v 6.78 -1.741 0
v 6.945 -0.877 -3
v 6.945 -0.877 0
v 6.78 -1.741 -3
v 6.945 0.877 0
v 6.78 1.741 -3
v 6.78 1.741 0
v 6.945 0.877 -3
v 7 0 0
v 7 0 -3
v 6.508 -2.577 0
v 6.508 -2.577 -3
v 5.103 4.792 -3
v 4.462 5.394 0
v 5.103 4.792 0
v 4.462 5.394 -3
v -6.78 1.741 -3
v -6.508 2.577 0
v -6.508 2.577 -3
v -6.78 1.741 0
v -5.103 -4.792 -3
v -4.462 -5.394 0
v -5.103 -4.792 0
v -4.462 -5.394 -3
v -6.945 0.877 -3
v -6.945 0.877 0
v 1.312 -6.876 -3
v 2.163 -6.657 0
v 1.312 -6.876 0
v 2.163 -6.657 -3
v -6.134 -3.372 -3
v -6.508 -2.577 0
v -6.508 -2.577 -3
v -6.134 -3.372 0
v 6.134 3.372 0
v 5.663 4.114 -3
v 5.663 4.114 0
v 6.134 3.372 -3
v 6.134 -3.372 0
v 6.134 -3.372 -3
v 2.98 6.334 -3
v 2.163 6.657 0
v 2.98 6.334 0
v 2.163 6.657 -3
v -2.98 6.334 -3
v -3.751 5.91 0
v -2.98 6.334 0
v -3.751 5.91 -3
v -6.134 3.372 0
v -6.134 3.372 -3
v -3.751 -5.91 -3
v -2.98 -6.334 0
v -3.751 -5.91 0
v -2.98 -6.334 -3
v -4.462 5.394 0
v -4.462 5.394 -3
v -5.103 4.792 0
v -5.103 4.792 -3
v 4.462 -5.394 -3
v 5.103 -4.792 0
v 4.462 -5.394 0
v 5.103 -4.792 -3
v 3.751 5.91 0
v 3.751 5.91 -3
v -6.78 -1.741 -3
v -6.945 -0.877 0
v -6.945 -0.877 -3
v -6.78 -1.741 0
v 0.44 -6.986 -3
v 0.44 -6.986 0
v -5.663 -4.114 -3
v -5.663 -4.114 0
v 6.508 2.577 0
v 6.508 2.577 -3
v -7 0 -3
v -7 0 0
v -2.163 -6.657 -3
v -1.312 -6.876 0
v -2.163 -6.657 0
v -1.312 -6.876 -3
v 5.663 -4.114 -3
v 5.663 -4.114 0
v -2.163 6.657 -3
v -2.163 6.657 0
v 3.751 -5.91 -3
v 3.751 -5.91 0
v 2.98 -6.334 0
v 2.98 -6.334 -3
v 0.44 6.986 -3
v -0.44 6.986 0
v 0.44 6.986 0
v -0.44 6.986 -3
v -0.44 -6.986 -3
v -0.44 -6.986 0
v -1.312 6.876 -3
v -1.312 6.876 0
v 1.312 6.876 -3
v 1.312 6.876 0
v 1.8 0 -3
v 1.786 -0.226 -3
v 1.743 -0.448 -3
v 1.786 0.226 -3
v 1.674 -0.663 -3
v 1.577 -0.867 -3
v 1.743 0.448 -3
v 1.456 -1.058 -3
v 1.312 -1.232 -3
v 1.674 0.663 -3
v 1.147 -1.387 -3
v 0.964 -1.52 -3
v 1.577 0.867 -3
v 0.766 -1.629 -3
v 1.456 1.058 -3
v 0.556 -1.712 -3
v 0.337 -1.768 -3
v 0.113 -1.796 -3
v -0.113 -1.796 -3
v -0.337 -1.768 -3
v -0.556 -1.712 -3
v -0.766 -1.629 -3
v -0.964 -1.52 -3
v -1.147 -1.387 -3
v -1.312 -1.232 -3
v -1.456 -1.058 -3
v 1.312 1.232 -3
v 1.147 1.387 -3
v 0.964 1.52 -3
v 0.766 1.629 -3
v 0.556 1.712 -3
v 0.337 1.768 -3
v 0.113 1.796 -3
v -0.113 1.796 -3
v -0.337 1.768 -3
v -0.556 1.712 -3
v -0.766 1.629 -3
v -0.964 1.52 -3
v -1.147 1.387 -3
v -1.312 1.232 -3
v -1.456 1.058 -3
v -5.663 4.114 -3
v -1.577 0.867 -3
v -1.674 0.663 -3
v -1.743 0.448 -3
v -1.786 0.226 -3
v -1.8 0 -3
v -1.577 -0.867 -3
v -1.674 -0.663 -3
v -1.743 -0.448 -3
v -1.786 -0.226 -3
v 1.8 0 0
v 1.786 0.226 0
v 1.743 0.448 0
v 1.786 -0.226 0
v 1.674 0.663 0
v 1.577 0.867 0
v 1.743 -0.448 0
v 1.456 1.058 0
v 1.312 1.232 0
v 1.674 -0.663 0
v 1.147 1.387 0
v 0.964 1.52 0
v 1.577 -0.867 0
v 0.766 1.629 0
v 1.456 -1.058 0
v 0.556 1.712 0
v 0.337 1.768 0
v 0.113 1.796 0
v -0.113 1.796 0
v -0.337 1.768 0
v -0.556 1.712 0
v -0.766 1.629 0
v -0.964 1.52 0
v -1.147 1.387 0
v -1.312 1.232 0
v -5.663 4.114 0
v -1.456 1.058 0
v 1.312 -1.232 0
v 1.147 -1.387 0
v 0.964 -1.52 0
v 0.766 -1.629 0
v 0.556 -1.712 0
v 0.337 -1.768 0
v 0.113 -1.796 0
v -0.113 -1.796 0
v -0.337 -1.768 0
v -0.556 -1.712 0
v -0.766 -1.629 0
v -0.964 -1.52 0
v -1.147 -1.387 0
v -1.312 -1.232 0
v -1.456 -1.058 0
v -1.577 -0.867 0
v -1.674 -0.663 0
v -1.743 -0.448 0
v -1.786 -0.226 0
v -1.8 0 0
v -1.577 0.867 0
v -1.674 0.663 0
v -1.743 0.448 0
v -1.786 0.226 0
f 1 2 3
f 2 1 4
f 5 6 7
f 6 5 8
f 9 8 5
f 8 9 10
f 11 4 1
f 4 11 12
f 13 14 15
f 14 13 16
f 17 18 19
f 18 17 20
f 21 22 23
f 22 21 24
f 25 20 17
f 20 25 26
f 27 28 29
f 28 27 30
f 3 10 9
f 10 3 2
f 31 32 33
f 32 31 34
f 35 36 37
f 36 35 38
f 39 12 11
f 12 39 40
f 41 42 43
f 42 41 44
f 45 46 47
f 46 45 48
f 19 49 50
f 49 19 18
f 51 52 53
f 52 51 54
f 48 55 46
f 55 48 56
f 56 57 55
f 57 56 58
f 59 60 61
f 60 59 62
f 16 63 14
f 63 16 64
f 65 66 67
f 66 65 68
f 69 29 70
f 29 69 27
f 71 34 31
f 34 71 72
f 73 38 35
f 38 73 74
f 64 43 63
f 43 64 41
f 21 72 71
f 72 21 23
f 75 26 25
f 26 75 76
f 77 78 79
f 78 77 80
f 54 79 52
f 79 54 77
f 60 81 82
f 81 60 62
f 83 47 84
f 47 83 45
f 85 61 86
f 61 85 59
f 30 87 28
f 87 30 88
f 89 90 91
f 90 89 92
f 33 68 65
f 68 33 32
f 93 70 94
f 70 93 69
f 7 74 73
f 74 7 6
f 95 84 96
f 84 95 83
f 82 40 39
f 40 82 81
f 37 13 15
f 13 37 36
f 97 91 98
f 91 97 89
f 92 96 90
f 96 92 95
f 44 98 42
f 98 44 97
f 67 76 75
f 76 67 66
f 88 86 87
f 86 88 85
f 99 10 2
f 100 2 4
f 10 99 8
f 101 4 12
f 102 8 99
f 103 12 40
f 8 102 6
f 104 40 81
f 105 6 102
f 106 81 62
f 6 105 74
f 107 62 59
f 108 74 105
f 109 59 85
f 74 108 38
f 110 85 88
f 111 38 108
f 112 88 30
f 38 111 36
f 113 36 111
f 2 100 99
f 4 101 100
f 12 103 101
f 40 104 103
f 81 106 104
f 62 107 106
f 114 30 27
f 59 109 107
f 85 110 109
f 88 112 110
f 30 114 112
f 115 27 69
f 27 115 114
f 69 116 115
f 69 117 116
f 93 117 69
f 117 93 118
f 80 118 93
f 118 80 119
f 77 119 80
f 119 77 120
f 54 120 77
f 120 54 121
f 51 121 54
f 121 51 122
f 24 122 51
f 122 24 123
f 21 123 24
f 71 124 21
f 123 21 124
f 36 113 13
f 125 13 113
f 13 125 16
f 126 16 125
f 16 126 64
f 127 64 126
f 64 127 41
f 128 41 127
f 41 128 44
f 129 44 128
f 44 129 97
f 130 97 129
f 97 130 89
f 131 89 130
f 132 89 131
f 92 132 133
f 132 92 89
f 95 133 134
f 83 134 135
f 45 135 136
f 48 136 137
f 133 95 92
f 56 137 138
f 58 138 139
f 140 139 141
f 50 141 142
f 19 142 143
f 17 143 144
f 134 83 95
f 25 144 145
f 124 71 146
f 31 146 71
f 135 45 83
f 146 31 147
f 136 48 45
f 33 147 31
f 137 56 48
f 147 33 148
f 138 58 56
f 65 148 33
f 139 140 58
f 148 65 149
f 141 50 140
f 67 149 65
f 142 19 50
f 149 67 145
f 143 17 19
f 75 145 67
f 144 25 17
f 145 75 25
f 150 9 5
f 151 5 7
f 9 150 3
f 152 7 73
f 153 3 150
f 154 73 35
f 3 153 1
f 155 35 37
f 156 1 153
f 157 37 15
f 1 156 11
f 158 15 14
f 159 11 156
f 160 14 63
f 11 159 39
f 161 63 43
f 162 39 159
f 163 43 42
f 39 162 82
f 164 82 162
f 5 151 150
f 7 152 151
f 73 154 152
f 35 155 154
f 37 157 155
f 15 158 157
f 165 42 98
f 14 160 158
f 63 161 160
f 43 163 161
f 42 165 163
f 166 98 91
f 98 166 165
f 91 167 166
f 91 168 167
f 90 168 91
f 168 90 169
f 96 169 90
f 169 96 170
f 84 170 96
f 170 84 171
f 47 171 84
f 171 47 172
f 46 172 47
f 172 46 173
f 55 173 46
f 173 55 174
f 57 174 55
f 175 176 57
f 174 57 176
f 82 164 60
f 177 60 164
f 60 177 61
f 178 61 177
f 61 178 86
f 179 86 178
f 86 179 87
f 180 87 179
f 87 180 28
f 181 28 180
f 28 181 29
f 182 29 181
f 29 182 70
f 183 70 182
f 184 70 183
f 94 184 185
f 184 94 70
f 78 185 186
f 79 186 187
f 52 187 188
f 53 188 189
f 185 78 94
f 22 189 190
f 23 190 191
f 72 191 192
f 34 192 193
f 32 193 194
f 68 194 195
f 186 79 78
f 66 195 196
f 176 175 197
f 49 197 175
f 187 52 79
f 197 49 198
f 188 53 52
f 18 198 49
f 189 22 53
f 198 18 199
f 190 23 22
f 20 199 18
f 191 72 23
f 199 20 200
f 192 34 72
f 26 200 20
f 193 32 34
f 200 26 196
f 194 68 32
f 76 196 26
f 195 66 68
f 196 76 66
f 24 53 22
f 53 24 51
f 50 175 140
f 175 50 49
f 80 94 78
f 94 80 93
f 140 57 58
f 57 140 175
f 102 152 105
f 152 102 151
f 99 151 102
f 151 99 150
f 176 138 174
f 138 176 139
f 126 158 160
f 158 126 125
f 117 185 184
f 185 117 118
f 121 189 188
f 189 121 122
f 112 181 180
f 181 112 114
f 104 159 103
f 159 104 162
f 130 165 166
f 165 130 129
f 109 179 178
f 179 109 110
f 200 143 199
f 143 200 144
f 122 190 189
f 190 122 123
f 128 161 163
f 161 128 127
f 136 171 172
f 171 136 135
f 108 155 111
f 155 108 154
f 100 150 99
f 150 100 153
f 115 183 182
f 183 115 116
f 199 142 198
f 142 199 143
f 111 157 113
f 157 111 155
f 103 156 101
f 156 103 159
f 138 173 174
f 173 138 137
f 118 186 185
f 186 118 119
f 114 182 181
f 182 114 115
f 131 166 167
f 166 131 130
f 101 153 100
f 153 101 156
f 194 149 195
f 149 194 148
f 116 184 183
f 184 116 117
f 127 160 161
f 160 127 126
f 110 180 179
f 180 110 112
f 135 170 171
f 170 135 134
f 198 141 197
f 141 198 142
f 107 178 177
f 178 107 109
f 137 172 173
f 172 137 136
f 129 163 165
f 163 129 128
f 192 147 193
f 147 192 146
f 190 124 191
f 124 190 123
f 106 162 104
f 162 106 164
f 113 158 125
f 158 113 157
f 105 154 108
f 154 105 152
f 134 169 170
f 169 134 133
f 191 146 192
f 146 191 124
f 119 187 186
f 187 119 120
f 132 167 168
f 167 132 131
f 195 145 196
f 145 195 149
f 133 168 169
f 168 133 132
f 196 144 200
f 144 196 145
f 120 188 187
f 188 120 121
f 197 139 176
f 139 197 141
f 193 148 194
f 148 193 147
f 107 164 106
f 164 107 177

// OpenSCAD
$fn = 50;


difference() {
	union() {
		translate(v = [0, 0, -3.0000000000]) {
			cylinder(h = 3, r = 7.0000000000);
		}
		cylinder(h = 0, r = 16.0000000000);
	}
	union() {
		#translate(v = [0, 0, -3]) {
			cylinder(h = 3, r = 1.8000000000);
		}
	}
}
